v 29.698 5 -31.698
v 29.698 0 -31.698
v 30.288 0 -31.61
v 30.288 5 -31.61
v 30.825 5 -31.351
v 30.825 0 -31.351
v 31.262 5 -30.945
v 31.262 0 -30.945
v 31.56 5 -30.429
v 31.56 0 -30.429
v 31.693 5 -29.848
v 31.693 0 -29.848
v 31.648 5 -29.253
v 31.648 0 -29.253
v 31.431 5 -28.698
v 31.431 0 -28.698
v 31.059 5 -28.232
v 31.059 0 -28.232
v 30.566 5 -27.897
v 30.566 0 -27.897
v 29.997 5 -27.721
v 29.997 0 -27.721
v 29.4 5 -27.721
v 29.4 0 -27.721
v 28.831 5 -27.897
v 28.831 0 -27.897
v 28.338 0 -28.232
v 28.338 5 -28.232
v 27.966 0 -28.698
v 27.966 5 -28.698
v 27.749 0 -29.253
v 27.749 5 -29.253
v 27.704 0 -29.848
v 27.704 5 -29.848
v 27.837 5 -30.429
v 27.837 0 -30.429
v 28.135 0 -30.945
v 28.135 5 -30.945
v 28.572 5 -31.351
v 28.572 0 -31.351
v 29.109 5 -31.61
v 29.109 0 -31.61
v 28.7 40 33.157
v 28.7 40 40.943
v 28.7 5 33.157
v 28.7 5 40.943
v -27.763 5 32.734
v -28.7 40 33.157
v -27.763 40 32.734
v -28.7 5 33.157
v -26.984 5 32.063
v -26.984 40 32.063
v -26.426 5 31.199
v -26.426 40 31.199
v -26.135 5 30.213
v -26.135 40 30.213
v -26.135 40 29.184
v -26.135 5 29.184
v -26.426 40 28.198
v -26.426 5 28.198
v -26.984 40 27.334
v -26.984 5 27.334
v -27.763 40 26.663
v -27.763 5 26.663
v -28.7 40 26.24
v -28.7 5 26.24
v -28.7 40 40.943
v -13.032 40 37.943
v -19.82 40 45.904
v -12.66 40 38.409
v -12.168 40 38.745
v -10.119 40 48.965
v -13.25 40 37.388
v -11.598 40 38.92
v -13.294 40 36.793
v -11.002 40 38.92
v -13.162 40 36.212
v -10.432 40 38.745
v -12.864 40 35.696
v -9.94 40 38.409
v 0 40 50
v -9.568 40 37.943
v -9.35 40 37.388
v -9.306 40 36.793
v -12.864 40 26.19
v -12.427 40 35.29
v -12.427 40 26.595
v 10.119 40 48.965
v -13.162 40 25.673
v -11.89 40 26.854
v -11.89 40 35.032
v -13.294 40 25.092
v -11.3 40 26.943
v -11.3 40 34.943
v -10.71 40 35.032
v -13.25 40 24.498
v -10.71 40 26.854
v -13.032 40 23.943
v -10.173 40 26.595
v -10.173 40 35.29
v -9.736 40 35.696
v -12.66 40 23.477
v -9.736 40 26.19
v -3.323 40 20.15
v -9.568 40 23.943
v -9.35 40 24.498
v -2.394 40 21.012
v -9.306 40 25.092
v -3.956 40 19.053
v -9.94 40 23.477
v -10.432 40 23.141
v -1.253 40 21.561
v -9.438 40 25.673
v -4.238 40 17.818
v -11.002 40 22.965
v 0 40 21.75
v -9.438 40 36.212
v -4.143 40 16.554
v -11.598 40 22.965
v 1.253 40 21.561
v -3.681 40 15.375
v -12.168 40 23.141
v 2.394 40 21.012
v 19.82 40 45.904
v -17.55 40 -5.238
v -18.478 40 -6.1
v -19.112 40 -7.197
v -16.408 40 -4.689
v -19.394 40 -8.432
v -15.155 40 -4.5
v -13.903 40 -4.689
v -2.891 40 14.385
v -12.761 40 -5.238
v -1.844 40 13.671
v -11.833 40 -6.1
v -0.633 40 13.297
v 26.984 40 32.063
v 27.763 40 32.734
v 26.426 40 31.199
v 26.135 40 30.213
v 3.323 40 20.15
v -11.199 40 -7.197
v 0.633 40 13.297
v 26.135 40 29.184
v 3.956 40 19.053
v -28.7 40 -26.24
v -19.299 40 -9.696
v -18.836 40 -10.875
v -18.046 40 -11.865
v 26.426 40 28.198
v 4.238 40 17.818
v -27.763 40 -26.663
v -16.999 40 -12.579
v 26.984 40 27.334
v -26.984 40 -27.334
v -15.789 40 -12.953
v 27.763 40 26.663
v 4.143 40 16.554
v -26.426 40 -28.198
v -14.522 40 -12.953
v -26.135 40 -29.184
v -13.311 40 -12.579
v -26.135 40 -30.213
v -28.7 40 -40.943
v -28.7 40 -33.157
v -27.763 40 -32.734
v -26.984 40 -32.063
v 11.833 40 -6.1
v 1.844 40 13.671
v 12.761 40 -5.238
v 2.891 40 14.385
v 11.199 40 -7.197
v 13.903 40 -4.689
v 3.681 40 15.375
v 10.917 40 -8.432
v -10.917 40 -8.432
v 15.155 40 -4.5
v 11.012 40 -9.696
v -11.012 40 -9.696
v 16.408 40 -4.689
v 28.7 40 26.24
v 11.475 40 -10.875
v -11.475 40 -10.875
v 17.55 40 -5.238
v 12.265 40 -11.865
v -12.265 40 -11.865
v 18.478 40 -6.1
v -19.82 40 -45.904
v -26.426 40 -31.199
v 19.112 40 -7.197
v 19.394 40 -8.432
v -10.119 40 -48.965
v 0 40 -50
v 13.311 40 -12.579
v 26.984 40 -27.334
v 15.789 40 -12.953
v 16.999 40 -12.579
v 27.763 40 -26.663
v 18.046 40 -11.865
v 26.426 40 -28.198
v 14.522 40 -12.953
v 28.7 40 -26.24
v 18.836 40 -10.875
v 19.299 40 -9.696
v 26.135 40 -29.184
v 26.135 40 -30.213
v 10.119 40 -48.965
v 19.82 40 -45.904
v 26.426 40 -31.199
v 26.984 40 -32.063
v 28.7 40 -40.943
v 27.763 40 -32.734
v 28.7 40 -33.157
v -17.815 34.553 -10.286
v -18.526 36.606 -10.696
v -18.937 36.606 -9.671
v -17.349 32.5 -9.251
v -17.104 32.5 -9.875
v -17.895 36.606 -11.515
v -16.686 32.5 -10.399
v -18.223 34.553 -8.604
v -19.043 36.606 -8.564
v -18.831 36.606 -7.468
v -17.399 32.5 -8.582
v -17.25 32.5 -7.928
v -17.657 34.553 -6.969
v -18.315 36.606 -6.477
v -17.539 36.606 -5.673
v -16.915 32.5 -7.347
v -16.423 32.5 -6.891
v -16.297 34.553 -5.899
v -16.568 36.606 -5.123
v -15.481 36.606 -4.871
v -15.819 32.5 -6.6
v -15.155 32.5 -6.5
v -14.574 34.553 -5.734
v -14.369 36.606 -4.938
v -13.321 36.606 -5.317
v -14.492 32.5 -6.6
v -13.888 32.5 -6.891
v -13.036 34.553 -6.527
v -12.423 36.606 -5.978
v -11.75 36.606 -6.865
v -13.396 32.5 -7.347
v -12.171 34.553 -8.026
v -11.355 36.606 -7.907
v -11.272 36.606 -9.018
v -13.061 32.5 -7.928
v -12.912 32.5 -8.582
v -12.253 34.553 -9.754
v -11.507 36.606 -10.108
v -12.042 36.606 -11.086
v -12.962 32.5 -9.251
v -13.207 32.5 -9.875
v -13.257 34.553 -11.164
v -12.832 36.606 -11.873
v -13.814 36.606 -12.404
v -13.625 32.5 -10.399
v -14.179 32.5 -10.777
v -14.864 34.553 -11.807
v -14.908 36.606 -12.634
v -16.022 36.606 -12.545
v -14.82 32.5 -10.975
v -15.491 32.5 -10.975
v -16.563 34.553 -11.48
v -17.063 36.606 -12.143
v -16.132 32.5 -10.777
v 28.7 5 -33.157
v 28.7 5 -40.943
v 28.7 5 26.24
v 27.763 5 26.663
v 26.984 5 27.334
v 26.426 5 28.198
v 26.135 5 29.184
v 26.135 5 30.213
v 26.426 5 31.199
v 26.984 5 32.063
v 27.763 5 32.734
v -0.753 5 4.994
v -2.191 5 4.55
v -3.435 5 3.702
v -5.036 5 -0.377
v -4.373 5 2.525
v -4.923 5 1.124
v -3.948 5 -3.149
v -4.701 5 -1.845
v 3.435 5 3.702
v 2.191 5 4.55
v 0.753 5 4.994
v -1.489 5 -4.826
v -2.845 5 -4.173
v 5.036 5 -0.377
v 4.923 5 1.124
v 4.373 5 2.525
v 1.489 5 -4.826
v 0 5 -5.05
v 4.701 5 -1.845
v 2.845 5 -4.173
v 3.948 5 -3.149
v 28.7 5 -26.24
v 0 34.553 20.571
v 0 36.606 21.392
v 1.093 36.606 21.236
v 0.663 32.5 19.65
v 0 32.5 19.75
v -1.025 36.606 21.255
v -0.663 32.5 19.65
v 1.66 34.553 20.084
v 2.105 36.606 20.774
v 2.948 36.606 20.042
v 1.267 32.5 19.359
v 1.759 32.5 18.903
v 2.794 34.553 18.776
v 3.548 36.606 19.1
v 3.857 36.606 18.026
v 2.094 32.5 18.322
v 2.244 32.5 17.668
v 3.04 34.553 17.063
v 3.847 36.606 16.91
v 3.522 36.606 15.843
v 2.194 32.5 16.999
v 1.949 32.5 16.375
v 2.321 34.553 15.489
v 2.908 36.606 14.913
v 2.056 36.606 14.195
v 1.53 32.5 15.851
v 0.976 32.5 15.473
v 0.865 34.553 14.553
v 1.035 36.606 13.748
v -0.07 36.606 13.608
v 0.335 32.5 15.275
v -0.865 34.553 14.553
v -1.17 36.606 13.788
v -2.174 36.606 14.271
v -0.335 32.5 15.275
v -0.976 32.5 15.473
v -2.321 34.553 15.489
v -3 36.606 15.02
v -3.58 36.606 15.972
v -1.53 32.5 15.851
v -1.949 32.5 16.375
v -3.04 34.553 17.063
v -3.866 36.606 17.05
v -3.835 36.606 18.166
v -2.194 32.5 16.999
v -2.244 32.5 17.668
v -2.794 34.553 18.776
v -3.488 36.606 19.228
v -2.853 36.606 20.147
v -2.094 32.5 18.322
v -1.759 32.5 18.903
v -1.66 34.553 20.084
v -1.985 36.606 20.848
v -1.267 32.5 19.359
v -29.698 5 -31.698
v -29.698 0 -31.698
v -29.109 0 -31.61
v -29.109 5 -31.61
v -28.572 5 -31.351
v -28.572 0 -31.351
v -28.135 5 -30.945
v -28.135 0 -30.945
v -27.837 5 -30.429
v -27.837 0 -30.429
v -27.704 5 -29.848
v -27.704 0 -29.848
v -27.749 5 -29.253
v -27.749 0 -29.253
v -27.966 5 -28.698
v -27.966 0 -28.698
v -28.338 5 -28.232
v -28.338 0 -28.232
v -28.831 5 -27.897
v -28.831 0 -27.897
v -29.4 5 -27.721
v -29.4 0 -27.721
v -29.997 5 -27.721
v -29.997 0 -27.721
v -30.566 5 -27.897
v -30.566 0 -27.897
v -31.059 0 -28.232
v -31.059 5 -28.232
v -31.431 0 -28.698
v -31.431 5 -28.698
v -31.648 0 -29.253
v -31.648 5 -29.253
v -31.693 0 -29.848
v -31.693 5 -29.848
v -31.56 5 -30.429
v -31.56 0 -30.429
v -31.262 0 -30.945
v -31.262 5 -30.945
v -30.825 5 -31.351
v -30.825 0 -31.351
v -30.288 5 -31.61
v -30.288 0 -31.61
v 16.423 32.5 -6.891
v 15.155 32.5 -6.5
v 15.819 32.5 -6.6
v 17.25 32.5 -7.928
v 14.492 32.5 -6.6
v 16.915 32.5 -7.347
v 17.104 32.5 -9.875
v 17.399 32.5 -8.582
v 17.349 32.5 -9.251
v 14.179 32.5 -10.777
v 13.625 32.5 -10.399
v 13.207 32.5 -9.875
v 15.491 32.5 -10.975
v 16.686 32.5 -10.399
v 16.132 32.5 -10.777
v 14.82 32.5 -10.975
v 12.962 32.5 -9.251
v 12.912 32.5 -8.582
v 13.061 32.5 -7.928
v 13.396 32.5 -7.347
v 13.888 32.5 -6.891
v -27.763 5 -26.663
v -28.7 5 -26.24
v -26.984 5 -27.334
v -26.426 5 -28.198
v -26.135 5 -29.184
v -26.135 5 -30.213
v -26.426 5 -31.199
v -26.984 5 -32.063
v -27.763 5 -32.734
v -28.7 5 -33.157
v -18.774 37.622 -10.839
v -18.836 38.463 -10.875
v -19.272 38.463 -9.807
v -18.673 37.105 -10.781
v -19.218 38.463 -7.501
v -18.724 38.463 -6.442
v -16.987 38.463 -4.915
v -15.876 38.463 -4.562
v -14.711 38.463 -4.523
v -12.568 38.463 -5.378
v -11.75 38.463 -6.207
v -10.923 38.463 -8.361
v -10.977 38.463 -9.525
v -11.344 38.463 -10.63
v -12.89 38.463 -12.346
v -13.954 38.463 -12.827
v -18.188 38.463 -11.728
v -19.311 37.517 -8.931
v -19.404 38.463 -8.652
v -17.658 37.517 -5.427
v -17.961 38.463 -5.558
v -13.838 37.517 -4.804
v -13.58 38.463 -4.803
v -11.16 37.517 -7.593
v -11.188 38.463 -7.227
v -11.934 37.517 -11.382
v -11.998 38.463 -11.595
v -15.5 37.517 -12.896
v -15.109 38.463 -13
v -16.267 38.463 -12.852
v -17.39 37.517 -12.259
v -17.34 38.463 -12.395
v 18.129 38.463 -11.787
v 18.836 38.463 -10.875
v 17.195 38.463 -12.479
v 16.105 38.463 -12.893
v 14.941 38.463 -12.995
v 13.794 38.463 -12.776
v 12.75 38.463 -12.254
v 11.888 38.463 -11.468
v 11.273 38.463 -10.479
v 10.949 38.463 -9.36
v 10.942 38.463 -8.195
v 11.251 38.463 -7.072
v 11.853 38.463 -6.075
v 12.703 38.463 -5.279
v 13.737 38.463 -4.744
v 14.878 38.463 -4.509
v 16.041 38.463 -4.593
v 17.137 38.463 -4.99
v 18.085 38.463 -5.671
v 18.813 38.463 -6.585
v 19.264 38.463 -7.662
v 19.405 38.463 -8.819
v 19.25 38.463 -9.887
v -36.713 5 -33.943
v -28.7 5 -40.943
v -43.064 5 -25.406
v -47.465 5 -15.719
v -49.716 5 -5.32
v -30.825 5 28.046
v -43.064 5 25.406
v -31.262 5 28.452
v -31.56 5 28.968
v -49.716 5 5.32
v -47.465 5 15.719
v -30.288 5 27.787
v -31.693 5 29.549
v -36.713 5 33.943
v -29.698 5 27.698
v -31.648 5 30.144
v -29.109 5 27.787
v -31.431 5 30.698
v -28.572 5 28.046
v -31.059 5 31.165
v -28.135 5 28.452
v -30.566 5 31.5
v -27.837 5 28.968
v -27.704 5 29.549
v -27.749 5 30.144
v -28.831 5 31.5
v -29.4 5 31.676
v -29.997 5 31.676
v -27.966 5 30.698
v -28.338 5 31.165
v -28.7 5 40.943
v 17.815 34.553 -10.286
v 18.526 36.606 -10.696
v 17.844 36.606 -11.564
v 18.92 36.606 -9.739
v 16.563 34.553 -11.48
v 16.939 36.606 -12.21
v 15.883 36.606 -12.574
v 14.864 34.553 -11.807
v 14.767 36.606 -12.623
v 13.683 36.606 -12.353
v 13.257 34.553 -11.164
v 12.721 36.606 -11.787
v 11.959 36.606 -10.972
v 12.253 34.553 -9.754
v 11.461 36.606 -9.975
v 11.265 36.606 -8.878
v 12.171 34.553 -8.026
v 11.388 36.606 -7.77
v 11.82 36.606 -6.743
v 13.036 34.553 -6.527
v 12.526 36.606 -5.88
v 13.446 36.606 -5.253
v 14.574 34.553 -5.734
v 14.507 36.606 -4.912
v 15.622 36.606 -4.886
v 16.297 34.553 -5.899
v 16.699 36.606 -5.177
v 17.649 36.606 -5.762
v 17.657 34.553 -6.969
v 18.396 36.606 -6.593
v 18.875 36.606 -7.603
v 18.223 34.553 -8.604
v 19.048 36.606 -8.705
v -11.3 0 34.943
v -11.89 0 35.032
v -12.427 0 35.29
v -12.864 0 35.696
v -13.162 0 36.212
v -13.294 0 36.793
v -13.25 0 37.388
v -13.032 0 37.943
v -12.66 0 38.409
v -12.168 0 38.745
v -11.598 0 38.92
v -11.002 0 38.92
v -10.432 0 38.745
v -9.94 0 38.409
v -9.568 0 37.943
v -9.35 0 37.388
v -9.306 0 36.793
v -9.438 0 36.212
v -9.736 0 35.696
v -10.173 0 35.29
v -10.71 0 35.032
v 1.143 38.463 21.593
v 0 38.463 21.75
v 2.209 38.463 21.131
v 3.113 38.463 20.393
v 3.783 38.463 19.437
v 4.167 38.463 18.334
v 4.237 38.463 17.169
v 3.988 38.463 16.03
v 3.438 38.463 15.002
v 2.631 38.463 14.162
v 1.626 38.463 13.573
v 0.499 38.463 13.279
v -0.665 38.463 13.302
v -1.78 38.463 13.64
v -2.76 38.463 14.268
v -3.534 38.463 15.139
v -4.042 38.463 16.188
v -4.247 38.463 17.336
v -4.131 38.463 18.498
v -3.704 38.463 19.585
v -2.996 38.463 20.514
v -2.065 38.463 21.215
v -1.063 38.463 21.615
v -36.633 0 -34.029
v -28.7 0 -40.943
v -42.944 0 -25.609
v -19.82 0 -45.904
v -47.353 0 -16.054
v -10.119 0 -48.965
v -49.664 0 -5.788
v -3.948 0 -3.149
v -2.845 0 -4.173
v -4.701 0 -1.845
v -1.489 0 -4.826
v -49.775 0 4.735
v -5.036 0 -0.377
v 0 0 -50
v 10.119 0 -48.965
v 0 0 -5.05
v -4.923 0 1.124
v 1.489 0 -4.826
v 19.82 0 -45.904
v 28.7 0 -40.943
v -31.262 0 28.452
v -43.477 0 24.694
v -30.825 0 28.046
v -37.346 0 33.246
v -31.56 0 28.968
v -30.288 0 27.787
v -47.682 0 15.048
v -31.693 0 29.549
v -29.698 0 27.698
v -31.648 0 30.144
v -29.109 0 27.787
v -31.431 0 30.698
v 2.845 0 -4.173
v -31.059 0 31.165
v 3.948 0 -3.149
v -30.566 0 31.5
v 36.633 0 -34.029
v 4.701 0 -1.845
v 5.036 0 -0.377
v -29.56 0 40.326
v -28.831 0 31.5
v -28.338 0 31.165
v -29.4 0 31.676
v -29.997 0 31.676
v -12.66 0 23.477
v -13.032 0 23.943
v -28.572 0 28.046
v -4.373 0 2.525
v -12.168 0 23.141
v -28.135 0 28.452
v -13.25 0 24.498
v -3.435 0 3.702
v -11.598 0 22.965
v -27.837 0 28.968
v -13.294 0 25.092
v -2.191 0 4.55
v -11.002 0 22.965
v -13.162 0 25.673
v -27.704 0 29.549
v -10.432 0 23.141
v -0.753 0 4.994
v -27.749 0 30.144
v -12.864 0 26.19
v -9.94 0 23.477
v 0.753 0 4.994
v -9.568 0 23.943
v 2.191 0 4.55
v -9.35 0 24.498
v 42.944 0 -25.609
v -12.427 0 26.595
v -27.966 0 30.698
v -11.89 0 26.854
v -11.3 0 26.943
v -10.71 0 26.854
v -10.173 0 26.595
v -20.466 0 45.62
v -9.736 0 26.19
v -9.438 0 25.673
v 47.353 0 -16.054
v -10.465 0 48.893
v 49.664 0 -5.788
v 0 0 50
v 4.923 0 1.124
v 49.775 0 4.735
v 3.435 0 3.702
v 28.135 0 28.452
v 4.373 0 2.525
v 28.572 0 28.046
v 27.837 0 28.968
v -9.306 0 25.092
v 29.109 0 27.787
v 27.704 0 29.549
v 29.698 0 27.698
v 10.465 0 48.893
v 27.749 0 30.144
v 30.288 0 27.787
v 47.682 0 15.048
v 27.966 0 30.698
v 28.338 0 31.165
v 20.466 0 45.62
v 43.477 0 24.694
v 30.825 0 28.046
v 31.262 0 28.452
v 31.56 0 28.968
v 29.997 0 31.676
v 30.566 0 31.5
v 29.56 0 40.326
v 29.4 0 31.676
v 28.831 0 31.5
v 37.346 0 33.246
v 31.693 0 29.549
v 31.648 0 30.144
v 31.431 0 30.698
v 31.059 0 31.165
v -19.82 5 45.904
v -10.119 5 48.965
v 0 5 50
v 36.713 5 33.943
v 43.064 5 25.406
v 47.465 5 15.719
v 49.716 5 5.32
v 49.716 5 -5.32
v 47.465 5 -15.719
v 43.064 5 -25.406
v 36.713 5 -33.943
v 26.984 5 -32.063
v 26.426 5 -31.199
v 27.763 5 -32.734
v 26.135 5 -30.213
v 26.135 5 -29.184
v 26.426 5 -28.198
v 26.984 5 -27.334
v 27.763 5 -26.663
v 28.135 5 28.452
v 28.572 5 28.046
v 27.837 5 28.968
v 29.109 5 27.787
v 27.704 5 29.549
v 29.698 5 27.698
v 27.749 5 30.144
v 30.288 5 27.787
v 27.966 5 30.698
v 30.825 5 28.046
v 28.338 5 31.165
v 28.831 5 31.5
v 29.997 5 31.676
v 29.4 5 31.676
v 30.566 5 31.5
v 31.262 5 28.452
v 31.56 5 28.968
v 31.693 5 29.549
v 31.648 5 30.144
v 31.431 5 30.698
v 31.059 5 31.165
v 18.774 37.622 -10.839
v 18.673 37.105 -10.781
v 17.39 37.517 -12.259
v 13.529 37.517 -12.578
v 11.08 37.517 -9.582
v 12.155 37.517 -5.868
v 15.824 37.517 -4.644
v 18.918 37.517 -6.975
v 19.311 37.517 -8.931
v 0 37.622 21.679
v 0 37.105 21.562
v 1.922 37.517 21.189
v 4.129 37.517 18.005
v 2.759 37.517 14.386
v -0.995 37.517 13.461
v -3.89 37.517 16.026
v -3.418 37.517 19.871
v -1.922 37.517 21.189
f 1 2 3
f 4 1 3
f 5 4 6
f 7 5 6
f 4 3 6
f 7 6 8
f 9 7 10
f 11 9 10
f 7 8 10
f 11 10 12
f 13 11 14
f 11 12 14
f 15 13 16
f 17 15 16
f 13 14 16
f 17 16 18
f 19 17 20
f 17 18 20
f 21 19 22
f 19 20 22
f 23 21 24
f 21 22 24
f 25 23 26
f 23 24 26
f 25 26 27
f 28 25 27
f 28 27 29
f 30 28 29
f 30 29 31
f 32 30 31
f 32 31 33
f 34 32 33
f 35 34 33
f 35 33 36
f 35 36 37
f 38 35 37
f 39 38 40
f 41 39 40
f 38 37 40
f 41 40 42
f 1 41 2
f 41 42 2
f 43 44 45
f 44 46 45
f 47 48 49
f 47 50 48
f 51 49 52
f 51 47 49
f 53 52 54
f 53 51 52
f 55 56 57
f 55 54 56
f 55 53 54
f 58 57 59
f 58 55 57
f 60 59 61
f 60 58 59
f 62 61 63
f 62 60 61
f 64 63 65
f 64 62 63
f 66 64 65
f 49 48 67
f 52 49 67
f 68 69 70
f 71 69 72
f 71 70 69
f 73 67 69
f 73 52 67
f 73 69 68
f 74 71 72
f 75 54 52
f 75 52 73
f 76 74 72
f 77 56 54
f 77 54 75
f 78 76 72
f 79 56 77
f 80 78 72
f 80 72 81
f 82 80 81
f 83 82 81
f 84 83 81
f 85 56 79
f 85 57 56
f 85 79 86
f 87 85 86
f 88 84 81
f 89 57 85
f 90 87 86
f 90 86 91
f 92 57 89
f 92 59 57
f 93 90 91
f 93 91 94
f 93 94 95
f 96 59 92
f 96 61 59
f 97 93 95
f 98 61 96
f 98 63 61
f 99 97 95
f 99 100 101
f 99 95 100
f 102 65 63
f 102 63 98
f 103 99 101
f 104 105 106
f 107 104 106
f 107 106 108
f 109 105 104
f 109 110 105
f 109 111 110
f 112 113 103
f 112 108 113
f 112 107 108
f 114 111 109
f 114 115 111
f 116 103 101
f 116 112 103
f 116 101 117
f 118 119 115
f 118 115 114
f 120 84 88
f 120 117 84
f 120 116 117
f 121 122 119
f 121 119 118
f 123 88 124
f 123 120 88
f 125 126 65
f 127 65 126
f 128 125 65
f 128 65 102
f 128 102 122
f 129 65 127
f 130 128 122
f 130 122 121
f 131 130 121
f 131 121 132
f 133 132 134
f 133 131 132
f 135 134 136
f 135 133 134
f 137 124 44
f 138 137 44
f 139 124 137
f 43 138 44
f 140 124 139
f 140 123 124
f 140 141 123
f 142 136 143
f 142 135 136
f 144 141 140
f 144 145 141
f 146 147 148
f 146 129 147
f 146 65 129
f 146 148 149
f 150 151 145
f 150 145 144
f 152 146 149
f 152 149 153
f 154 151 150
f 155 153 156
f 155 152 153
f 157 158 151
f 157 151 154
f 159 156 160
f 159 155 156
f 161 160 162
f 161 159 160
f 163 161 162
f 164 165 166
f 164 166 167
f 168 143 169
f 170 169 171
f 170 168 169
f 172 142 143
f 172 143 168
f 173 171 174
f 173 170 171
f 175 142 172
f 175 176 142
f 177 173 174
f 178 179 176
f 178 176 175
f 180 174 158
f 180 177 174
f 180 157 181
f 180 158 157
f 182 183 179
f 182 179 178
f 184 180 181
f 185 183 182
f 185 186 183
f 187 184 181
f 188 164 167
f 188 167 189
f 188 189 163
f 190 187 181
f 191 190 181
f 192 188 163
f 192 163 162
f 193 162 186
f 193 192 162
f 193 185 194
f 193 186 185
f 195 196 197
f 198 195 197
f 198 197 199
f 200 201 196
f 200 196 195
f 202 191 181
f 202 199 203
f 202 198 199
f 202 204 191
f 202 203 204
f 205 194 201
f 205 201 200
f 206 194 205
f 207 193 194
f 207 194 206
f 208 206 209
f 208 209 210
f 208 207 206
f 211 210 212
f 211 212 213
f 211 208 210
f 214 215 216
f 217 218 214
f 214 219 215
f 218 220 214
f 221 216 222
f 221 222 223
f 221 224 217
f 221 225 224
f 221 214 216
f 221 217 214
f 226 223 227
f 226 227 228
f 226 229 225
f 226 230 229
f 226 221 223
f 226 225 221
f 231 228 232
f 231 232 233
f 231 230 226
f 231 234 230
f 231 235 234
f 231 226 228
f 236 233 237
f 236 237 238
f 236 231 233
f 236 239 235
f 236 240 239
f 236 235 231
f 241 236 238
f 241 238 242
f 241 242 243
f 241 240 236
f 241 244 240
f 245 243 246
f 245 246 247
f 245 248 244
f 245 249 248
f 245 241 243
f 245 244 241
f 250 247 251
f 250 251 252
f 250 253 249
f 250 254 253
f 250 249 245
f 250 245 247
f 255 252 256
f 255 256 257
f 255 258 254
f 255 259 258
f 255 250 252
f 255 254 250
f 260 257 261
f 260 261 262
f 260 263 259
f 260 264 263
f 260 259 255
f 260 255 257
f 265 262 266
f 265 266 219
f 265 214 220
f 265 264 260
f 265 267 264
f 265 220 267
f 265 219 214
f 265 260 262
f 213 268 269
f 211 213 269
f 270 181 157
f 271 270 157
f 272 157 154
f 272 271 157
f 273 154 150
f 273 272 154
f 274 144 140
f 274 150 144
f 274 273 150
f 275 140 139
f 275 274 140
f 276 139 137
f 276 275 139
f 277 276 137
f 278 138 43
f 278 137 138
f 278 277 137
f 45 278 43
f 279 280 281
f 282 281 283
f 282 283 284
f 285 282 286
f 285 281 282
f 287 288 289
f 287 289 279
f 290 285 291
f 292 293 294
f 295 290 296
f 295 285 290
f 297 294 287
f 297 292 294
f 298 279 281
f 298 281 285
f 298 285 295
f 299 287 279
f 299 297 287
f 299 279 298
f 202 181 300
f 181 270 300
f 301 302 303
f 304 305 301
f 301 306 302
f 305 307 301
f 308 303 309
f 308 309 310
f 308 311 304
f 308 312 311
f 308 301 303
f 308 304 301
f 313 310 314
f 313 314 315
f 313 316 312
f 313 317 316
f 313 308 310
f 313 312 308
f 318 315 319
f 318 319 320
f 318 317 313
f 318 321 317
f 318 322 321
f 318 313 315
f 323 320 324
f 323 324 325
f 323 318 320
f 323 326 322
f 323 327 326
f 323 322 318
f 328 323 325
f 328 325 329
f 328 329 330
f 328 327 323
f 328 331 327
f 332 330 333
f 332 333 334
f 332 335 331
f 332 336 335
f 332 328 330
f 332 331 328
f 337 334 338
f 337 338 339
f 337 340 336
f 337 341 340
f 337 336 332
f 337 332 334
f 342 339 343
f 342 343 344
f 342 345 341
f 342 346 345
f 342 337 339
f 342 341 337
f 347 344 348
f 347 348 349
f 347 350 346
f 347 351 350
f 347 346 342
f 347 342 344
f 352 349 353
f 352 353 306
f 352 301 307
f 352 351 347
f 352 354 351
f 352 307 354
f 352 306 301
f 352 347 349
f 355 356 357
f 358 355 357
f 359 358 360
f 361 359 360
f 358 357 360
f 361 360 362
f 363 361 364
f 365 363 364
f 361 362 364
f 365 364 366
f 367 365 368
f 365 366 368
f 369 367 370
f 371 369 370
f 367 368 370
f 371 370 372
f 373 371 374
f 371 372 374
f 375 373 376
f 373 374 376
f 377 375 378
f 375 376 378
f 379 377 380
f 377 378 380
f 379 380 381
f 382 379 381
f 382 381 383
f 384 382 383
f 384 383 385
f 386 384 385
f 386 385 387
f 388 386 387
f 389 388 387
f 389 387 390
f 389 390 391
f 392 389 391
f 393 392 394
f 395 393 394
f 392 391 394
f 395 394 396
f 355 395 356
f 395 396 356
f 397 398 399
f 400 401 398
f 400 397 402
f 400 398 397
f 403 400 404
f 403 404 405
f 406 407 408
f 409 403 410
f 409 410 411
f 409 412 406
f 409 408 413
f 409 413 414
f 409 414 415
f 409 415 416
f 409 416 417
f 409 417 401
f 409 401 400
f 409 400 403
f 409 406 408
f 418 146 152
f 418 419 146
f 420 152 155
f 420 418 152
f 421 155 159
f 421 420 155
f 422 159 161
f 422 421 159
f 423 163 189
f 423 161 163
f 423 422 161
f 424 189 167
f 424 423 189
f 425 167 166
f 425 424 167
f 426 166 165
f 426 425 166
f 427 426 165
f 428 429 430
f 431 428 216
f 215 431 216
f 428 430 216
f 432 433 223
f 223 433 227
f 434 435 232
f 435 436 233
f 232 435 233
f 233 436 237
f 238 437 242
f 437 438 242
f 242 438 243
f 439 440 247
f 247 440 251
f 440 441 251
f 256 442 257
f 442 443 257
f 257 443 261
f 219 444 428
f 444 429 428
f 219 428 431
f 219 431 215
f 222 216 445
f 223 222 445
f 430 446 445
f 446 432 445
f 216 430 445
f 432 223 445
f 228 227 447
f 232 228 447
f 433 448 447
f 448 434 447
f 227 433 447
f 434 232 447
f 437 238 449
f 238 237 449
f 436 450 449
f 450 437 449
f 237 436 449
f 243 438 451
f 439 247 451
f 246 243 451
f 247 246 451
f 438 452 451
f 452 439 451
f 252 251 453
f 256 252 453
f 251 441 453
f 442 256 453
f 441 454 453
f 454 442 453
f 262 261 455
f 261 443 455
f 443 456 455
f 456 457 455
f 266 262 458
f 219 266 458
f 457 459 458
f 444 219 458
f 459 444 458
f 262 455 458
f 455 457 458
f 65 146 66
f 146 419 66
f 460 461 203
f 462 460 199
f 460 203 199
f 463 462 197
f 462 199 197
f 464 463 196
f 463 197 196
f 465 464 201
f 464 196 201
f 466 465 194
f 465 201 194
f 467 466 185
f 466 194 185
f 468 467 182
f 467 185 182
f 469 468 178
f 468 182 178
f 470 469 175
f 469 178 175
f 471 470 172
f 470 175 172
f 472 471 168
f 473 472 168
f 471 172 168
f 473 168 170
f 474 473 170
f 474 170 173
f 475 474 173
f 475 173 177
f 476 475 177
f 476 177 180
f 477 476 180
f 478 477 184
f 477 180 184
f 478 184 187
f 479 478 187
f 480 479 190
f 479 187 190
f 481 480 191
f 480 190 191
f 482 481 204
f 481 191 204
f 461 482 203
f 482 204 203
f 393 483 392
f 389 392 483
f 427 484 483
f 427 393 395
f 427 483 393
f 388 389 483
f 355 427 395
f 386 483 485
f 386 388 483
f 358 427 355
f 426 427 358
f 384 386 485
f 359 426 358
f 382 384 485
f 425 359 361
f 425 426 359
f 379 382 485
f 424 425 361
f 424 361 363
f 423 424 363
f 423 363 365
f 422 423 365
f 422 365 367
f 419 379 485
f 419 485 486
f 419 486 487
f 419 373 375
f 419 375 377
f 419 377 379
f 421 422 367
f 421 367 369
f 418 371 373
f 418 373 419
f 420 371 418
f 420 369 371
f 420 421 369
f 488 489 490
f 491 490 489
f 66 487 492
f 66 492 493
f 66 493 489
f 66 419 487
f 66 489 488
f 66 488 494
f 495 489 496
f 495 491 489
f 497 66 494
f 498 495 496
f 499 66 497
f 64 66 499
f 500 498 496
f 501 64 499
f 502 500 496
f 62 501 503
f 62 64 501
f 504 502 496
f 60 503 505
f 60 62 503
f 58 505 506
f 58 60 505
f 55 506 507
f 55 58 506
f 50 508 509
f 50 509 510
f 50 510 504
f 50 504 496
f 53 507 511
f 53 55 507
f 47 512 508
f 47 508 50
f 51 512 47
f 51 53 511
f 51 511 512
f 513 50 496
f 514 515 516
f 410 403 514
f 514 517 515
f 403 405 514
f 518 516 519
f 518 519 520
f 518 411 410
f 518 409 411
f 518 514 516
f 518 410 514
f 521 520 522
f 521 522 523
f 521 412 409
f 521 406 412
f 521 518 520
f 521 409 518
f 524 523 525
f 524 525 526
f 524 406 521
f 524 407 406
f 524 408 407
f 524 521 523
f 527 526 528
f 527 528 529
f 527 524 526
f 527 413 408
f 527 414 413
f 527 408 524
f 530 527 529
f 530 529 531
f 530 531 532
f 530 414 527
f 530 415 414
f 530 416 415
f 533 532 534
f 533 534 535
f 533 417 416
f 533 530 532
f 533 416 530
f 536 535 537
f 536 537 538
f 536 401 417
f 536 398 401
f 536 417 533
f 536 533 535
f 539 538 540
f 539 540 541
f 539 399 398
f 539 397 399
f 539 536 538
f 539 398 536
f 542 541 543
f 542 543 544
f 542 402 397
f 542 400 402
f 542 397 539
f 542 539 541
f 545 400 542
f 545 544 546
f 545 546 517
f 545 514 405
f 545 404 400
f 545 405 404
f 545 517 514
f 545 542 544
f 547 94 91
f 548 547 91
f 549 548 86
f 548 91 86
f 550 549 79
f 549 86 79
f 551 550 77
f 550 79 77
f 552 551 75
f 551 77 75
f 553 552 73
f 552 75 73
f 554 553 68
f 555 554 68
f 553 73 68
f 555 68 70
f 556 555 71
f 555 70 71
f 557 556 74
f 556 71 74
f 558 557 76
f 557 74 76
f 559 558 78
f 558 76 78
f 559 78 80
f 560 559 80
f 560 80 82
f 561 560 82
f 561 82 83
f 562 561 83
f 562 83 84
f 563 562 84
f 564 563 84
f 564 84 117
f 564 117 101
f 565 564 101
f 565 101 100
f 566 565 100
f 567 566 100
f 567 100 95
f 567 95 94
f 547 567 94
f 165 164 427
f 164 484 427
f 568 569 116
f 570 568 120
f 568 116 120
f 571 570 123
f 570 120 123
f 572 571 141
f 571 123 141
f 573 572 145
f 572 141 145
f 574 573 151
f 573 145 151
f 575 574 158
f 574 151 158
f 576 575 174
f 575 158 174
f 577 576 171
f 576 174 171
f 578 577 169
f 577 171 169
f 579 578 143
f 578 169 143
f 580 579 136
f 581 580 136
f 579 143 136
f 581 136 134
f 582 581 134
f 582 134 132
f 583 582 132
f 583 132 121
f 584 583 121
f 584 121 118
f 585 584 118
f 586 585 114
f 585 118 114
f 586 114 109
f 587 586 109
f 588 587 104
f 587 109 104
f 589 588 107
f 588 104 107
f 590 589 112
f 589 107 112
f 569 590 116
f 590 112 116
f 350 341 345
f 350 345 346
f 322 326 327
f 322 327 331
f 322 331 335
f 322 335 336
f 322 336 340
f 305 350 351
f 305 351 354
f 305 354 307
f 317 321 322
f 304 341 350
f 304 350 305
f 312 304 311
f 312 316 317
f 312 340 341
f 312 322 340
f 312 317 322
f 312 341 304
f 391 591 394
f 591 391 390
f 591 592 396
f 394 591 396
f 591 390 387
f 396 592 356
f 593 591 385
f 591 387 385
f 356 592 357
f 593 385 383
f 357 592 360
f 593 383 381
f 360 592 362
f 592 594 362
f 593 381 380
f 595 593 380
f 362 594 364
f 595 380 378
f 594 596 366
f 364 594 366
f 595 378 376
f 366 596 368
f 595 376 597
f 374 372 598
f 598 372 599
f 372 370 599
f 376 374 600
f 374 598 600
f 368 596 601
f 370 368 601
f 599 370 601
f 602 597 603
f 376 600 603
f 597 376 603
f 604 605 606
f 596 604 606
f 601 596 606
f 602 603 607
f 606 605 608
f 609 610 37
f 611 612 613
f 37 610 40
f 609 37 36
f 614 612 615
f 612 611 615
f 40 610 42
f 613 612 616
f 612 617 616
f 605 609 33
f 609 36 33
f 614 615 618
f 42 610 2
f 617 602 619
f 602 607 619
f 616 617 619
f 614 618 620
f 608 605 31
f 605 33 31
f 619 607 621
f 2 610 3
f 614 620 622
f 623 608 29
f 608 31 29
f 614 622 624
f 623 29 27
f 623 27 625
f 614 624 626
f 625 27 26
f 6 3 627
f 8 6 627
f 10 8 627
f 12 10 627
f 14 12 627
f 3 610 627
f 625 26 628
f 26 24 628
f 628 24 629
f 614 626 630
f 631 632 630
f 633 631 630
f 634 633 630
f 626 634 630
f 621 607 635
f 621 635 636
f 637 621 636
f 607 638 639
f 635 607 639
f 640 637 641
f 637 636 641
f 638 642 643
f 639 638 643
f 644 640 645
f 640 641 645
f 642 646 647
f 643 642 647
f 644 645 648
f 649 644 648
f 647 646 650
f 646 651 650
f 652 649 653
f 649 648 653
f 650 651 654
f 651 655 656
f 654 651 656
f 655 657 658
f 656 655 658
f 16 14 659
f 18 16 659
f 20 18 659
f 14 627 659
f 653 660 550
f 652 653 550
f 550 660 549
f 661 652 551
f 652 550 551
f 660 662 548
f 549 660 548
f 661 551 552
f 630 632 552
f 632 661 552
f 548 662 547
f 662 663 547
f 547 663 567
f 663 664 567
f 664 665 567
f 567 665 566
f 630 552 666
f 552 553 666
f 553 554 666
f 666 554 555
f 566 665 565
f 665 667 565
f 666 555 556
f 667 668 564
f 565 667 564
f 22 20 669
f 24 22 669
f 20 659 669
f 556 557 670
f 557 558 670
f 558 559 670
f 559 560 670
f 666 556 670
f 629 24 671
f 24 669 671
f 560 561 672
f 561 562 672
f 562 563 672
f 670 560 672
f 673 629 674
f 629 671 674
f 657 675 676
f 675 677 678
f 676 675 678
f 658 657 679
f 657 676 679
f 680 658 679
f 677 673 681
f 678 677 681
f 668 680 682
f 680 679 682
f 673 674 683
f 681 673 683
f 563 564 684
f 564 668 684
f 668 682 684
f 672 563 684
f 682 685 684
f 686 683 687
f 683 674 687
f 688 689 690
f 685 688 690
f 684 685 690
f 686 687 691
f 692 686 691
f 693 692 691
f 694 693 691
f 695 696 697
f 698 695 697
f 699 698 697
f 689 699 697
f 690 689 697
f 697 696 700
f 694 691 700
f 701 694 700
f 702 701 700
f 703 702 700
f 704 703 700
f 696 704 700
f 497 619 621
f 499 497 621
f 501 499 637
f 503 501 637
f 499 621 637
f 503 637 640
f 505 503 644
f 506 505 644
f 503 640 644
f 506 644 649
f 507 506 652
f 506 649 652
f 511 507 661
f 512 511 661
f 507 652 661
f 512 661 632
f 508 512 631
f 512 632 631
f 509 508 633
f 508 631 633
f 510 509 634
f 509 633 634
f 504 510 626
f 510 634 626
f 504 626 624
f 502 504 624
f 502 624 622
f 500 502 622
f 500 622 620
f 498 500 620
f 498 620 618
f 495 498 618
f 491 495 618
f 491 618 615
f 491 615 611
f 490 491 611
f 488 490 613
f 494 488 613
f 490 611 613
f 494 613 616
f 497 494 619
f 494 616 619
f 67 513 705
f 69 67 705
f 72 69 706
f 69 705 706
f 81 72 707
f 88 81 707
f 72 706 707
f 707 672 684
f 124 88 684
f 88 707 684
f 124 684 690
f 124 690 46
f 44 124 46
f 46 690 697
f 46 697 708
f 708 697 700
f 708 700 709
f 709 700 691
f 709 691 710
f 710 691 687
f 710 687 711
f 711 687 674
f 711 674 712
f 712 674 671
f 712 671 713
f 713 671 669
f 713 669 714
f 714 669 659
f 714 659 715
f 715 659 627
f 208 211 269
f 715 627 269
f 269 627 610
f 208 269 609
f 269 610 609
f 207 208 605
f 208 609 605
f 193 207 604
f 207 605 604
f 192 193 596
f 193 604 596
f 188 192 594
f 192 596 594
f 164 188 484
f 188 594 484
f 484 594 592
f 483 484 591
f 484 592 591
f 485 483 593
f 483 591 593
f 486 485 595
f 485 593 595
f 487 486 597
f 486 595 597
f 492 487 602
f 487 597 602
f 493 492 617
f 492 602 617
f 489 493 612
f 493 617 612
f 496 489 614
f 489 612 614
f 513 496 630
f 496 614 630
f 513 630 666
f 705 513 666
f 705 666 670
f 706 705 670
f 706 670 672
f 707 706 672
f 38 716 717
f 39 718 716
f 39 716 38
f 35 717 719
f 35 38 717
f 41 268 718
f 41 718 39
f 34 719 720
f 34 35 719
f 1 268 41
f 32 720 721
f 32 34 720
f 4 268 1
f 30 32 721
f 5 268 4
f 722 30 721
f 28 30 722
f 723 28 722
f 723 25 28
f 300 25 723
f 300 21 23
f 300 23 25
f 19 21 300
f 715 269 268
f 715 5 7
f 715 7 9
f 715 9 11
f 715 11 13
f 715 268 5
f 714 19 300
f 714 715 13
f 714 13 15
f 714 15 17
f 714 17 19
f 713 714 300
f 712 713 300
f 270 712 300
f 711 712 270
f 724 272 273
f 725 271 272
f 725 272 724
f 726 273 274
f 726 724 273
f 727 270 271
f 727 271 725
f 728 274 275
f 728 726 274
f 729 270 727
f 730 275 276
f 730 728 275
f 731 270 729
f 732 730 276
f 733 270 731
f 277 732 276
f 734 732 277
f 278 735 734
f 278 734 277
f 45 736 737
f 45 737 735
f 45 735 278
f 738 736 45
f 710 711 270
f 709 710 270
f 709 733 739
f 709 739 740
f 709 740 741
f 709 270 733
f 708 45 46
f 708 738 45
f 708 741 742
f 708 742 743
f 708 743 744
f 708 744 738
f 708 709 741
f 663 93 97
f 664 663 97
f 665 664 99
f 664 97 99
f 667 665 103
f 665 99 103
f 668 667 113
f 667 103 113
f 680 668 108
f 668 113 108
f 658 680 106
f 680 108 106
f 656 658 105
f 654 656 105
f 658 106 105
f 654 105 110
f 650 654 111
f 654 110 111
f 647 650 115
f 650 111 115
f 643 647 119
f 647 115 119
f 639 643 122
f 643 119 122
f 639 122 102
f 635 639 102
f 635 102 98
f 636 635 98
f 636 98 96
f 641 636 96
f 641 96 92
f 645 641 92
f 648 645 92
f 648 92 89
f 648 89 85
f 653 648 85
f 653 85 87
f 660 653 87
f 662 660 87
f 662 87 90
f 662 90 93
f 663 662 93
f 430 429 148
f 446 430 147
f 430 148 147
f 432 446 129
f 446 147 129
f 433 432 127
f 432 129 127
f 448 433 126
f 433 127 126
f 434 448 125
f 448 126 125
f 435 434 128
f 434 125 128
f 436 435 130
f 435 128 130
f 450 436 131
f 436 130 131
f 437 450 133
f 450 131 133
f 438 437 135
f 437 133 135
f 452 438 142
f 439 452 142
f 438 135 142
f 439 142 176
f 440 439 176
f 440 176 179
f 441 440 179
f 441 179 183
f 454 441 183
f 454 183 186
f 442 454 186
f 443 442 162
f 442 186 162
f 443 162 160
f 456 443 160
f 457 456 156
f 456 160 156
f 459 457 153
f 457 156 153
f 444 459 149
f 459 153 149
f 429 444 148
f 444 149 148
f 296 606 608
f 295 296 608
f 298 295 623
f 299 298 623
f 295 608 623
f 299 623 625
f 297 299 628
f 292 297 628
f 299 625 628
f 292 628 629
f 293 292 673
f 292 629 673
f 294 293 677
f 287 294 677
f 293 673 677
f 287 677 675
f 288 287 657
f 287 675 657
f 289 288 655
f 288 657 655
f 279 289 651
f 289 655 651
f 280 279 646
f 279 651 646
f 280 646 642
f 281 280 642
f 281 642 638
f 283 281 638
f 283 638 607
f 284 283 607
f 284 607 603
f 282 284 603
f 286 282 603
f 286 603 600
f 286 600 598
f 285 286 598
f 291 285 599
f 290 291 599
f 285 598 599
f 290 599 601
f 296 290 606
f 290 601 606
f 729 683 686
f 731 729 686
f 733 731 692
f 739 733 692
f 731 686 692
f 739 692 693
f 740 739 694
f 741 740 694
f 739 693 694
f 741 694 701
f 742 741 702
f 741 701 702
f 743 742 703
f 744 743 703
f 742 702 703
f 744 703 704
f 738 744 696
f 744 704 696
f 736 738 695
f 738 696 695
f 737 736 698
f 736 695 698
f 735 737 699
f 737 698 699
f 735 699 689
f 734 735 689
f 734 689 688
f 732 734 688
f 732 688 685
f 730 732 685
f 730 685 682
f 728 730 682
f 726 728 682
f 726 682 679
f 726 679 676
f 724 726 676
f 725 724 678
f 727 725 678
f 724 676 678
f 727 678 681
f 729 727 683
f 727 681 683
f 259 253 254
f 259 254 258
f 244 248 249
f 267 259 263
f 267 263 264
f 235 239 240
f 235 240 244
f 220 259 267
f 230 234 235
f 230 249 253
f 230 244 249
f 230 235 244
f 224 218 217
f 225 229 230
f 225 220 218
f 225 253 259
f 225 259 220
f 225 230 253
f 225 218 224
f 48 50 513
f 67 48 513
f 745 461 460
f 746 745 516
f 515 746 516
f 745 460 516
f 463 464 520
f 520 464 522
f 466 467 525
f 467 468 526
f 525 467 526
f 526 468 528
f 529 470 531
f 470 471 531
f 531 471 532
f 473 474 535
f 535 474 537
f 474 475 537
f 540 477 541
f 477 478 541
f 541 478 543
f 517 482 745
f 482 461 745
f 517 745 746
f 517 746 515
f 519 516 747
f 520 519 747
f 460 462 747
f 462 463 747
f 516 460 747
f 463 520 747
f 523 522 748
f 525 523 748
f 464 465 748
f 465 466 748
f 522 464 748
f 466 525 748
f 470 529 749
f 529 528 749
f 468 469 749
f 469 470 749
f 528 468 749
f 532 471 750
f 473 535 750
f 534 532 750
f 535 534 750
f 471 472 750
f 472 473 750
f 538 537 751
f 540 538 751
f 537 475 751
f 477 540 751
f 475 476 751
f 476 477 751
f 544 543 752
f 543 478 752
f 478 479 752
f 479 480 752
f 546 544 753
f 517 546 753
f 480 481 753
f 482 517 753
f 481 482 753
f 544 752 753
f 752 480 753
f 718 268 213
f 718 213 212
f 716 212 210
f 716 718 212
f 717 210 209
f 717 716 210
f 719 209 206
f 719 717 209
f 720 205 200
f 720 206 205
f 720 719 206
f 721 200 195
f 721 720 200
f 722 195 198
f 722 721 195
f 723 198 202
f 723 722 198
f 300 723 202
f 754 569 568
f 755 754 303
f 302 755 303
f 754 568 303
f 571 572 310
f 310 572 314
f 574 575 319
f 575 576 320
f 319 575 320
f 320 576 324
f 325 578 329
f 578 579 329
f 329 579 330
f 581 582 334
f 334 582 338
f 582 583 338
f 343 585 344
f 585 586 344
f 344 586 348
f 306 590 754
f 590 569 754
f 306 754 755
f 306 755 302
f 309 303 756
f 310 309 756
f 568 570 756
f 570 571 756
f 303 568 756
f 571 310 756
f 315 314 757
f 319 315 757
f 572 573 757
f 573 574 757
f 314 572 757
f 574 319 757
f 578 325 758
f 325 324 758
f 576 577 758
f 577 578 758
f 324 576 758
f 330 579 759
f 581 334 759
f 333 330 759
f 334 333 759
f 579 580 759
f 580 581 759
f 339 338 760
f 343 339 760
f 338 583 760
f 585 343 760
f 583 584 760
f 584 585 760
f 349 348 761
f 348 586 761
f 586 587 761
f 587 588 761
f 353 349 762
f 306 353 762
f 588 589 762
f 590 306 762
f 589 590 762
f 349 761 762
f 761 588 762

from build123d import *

# Parameters (mm, degrees)
ARA_D_ZLEM_R                    = 50
BASE_DEPTH                      = 5
Y_KSEKLIK_EKSTR_ZYON2_DEPTH     = 40
IZIM2_R                         = 2
BANANA_SLOTLAR_DEPTH            = 82.240384046
IZIM3_R                         = 2
IZIM3_R_2                       = 5.05
KES_EKSTR_ZYON1_DEPTH           = 5
IZIM3_2_R                       = 2
KES_EKSTR_ZYON2_DEPTH           = 82.240384046
IZIM5_R                         = 3.6
KES_EKSTR_ZYON3_DEPTH           = 79.89866919
IZIM6_R                         = 4.25
KES_EKSTR_ZYON4_DEPTH           = 7.5
PAH1_SIZE                       = 5
PAH1_SIZE2                      = 2
RADYUS1_R                       = 5
DAIRESEL_KAPLAMA1_COUNT         = 3
PAH1_OF_DAIRESEL_KAPLAMA1_SIZE2 = 2
PAH1_OF_DAIRESEL_KAPLAMA1_SIZE  = 5
RADYUS1_OF_DAIRESEL_KAPLAMA1_R  = 5


with BuildPart() as part:
    # ara düzlem → base (new body)
    with BuildSketch(Plane(origin=(0, 0, 0), x_dir=(1, 0, 0), z_dir=(0, 1, 0))):
        Circle(ARA_D_ZLEM_R)
    extrude(amount=BASE_DEPTH)

    # Çizim1<3> → Yükseklik-Ekstrüzyon2 (add)
    with BuildSketch(Plane(origin=(0, 0, 0), x_dir=(1, 0, 0), z_dir=(0, 1, 0))):
        with BuildLine():
            ThreePointArc((28.7, 40.942764929), (0, 50), (-28.7, 40.942764929))
            Line((-28.7, 40.942764929), (-28.7, -40.942764929))
            ThreePointArc((-28.7, -40.942764929), (0, -50), (28.7, -40.942764929))
            Line((28.7, -40.942764929), (28.7, 40.942764929))
        make_face()
    extrude(amount=Y_KSEKLIK_EKSTR_ZYON2_DEPTH)

    # Çizim2 → banana slotlar (cut, through all)
    with BuildSketch(Plane(origin=(0, 40, 0), x_dir=(1, 0, 0), z_dir=(0, 1, 0))):
        with Locations((-11.3, -24.942764929)):
            Circle(IZIM2_R)
        with Locations((-11.3, -36.942764929)):
            Circle(IZIM2_R)
    extrude(amount=-BANANA_SLOTLAR_DEPTH, mode=Mode.SUBTRACT)

    # Çizim3 → Kes-Ekstrüzyon1 (cut)
    with BuildSketch(Plane.XZ):
        with Locations((-29.69848481, 29.69848481)):
            Circle(IZIM3_R)
        with Locations((29.69848481, 29.69848481)):
            Circle(IZIM3_R)
        with Locations((29.69848481, -29.69848481)):
            Circle(IZIM3_R)
        with Locations((-29.69848481, -29.69848481)):
            Circle(IZIM3_R)
        Circle(IZIM3_R_2)
    extrude(amount=-KES_EKSTR_ZYON1_DEPTH, mode=Mode.SUBTRACT)

    # Çizim3<2> → Kes-Ekstrüzyon2 (cut, through all)
    with BuildSketch(Plane.XZ):
        with Locations((-29.69848481, 29.69848481)):
            Circle(IZIM3_2_R)
        with Locations((29.69848481, 29.69848481)):
            Circle(IZIM3_2_R)
        with Locations((29.69848481, -29.69848481)):
            Circle(IZIM3_2_R)
        with Locations((-29.69848481, -29.69848481)):
            Circle(IZIM3_2_R)
    extrude(amount=-KES_EKSTR_ZYON2_DEPTH, mode=Mode.SUBTRACT)

    # Çizim5 → Kes-Ekstrüzyon3 (cut, through all)
    with BuildSketch(Plane(origin=(0, 5, 0), x_dir=(1, 0, 0), z_dir=(0, 1, 0))):
        with Locations((29.69848481, -29.69848481)):
            Circle(IZIM5_R)
        with Locations((-29.69848481, -29.69848481)):
            Circle(IZIM5_R)
        with Locations((-29.69848481, 29.69848481)):
            Circle(IZIM5_R)
        with Locations((29.69848481, 29.69848481)):
            Circle(IZIM5_R)
    extrude(amount=KES_EKSTR_ZYON3_DEPTH, mode=Mode.SUBTRACT)

    # Çizim6 → Kes-Ekstrüzyon4 (cut)
    with BuildSketch(Plane(origin=(0, 40, 0), x_dir=(1, 0, 0), z_dir=(0, 1, 0))):
        with Locations((0, -17.5)):
            Circle(IZIM6_R)
    kes_ekstr_zyon4 = extrude(amount=-KES_EKSTR_ZYON4_DEPTH, mode=Mode.SUBTRACT)

    # Pah1
    pah1_edges = [part.edges().sort_by_distance(p)[0] for p in [
        (-4.25, 32.5, 17.5),
    ]]
    pah1_side = [part.faces().sort_by_distance(p)[0] for p in [
        (-4.25, 36.25, 17.5),
    ]]
    chamfer(pah1_edges, length=PAH1_SIZE, length2=PAH1_SIZE2, reference=pah1_side[0])

    # Radyus1
    radyus1_edges = [part.edges().sort_by_distance(p)[0] for p in [
        (-4.25, 37.5, 17.5),
    ]]
    fillet(radyus1_edges, radius=RADYUS1_R)

    # Dairesel Kaplama1: Kes-Ekstrüzyon4 ×3 about axis
    dairesel_kaplama1_axis = Axis((0, 5, 0), (0, -1, 0))
    for i in range(1, DAIRESEL_KAPLAMA1_COUNT):
        add(kes_ekstr_zyon4.rotate(dairesel_kaplama1_axis, i * 360 / DAIRESEL_KAPLAMA1_COUNT), mode=Mode.SUBTRACT)

    # Pah1 of Dairesel Kaplama1
    pah1_of_dairesel_kaplama1_edges = [part.edges().sort_by_distance(p)[0] for p in [
        (-13.030444566, 32.5, -12.430607966),
        (17.280444566, 32.5, -5.069392034),
    ]]
    chamfer(pah1_of_dairesel_kaplama1_edges, length=PAH1_OF_DAIRESEL_KAPLAMA1_SIZE, length2=PAH1_OF_DAIRESEL_KAPLAMA1_SIZE2)

    # Radyus1 of Dairesel Kaplama1
    radyus1_of_dairesel_kaplama1_edges = [part.edges().sort_by_distance(p)[0] for p in [
        (-13.030444566, 37.5, -12.430607966),
        (17.280444566, 37.5, -5.069392034),
    ]]
    fillet(radyus1_of_dairesel_kaplama1_edges, radius=RADYUS1_OF_DAIRESEL_KAPLAMA1_R)


solid = part.part
